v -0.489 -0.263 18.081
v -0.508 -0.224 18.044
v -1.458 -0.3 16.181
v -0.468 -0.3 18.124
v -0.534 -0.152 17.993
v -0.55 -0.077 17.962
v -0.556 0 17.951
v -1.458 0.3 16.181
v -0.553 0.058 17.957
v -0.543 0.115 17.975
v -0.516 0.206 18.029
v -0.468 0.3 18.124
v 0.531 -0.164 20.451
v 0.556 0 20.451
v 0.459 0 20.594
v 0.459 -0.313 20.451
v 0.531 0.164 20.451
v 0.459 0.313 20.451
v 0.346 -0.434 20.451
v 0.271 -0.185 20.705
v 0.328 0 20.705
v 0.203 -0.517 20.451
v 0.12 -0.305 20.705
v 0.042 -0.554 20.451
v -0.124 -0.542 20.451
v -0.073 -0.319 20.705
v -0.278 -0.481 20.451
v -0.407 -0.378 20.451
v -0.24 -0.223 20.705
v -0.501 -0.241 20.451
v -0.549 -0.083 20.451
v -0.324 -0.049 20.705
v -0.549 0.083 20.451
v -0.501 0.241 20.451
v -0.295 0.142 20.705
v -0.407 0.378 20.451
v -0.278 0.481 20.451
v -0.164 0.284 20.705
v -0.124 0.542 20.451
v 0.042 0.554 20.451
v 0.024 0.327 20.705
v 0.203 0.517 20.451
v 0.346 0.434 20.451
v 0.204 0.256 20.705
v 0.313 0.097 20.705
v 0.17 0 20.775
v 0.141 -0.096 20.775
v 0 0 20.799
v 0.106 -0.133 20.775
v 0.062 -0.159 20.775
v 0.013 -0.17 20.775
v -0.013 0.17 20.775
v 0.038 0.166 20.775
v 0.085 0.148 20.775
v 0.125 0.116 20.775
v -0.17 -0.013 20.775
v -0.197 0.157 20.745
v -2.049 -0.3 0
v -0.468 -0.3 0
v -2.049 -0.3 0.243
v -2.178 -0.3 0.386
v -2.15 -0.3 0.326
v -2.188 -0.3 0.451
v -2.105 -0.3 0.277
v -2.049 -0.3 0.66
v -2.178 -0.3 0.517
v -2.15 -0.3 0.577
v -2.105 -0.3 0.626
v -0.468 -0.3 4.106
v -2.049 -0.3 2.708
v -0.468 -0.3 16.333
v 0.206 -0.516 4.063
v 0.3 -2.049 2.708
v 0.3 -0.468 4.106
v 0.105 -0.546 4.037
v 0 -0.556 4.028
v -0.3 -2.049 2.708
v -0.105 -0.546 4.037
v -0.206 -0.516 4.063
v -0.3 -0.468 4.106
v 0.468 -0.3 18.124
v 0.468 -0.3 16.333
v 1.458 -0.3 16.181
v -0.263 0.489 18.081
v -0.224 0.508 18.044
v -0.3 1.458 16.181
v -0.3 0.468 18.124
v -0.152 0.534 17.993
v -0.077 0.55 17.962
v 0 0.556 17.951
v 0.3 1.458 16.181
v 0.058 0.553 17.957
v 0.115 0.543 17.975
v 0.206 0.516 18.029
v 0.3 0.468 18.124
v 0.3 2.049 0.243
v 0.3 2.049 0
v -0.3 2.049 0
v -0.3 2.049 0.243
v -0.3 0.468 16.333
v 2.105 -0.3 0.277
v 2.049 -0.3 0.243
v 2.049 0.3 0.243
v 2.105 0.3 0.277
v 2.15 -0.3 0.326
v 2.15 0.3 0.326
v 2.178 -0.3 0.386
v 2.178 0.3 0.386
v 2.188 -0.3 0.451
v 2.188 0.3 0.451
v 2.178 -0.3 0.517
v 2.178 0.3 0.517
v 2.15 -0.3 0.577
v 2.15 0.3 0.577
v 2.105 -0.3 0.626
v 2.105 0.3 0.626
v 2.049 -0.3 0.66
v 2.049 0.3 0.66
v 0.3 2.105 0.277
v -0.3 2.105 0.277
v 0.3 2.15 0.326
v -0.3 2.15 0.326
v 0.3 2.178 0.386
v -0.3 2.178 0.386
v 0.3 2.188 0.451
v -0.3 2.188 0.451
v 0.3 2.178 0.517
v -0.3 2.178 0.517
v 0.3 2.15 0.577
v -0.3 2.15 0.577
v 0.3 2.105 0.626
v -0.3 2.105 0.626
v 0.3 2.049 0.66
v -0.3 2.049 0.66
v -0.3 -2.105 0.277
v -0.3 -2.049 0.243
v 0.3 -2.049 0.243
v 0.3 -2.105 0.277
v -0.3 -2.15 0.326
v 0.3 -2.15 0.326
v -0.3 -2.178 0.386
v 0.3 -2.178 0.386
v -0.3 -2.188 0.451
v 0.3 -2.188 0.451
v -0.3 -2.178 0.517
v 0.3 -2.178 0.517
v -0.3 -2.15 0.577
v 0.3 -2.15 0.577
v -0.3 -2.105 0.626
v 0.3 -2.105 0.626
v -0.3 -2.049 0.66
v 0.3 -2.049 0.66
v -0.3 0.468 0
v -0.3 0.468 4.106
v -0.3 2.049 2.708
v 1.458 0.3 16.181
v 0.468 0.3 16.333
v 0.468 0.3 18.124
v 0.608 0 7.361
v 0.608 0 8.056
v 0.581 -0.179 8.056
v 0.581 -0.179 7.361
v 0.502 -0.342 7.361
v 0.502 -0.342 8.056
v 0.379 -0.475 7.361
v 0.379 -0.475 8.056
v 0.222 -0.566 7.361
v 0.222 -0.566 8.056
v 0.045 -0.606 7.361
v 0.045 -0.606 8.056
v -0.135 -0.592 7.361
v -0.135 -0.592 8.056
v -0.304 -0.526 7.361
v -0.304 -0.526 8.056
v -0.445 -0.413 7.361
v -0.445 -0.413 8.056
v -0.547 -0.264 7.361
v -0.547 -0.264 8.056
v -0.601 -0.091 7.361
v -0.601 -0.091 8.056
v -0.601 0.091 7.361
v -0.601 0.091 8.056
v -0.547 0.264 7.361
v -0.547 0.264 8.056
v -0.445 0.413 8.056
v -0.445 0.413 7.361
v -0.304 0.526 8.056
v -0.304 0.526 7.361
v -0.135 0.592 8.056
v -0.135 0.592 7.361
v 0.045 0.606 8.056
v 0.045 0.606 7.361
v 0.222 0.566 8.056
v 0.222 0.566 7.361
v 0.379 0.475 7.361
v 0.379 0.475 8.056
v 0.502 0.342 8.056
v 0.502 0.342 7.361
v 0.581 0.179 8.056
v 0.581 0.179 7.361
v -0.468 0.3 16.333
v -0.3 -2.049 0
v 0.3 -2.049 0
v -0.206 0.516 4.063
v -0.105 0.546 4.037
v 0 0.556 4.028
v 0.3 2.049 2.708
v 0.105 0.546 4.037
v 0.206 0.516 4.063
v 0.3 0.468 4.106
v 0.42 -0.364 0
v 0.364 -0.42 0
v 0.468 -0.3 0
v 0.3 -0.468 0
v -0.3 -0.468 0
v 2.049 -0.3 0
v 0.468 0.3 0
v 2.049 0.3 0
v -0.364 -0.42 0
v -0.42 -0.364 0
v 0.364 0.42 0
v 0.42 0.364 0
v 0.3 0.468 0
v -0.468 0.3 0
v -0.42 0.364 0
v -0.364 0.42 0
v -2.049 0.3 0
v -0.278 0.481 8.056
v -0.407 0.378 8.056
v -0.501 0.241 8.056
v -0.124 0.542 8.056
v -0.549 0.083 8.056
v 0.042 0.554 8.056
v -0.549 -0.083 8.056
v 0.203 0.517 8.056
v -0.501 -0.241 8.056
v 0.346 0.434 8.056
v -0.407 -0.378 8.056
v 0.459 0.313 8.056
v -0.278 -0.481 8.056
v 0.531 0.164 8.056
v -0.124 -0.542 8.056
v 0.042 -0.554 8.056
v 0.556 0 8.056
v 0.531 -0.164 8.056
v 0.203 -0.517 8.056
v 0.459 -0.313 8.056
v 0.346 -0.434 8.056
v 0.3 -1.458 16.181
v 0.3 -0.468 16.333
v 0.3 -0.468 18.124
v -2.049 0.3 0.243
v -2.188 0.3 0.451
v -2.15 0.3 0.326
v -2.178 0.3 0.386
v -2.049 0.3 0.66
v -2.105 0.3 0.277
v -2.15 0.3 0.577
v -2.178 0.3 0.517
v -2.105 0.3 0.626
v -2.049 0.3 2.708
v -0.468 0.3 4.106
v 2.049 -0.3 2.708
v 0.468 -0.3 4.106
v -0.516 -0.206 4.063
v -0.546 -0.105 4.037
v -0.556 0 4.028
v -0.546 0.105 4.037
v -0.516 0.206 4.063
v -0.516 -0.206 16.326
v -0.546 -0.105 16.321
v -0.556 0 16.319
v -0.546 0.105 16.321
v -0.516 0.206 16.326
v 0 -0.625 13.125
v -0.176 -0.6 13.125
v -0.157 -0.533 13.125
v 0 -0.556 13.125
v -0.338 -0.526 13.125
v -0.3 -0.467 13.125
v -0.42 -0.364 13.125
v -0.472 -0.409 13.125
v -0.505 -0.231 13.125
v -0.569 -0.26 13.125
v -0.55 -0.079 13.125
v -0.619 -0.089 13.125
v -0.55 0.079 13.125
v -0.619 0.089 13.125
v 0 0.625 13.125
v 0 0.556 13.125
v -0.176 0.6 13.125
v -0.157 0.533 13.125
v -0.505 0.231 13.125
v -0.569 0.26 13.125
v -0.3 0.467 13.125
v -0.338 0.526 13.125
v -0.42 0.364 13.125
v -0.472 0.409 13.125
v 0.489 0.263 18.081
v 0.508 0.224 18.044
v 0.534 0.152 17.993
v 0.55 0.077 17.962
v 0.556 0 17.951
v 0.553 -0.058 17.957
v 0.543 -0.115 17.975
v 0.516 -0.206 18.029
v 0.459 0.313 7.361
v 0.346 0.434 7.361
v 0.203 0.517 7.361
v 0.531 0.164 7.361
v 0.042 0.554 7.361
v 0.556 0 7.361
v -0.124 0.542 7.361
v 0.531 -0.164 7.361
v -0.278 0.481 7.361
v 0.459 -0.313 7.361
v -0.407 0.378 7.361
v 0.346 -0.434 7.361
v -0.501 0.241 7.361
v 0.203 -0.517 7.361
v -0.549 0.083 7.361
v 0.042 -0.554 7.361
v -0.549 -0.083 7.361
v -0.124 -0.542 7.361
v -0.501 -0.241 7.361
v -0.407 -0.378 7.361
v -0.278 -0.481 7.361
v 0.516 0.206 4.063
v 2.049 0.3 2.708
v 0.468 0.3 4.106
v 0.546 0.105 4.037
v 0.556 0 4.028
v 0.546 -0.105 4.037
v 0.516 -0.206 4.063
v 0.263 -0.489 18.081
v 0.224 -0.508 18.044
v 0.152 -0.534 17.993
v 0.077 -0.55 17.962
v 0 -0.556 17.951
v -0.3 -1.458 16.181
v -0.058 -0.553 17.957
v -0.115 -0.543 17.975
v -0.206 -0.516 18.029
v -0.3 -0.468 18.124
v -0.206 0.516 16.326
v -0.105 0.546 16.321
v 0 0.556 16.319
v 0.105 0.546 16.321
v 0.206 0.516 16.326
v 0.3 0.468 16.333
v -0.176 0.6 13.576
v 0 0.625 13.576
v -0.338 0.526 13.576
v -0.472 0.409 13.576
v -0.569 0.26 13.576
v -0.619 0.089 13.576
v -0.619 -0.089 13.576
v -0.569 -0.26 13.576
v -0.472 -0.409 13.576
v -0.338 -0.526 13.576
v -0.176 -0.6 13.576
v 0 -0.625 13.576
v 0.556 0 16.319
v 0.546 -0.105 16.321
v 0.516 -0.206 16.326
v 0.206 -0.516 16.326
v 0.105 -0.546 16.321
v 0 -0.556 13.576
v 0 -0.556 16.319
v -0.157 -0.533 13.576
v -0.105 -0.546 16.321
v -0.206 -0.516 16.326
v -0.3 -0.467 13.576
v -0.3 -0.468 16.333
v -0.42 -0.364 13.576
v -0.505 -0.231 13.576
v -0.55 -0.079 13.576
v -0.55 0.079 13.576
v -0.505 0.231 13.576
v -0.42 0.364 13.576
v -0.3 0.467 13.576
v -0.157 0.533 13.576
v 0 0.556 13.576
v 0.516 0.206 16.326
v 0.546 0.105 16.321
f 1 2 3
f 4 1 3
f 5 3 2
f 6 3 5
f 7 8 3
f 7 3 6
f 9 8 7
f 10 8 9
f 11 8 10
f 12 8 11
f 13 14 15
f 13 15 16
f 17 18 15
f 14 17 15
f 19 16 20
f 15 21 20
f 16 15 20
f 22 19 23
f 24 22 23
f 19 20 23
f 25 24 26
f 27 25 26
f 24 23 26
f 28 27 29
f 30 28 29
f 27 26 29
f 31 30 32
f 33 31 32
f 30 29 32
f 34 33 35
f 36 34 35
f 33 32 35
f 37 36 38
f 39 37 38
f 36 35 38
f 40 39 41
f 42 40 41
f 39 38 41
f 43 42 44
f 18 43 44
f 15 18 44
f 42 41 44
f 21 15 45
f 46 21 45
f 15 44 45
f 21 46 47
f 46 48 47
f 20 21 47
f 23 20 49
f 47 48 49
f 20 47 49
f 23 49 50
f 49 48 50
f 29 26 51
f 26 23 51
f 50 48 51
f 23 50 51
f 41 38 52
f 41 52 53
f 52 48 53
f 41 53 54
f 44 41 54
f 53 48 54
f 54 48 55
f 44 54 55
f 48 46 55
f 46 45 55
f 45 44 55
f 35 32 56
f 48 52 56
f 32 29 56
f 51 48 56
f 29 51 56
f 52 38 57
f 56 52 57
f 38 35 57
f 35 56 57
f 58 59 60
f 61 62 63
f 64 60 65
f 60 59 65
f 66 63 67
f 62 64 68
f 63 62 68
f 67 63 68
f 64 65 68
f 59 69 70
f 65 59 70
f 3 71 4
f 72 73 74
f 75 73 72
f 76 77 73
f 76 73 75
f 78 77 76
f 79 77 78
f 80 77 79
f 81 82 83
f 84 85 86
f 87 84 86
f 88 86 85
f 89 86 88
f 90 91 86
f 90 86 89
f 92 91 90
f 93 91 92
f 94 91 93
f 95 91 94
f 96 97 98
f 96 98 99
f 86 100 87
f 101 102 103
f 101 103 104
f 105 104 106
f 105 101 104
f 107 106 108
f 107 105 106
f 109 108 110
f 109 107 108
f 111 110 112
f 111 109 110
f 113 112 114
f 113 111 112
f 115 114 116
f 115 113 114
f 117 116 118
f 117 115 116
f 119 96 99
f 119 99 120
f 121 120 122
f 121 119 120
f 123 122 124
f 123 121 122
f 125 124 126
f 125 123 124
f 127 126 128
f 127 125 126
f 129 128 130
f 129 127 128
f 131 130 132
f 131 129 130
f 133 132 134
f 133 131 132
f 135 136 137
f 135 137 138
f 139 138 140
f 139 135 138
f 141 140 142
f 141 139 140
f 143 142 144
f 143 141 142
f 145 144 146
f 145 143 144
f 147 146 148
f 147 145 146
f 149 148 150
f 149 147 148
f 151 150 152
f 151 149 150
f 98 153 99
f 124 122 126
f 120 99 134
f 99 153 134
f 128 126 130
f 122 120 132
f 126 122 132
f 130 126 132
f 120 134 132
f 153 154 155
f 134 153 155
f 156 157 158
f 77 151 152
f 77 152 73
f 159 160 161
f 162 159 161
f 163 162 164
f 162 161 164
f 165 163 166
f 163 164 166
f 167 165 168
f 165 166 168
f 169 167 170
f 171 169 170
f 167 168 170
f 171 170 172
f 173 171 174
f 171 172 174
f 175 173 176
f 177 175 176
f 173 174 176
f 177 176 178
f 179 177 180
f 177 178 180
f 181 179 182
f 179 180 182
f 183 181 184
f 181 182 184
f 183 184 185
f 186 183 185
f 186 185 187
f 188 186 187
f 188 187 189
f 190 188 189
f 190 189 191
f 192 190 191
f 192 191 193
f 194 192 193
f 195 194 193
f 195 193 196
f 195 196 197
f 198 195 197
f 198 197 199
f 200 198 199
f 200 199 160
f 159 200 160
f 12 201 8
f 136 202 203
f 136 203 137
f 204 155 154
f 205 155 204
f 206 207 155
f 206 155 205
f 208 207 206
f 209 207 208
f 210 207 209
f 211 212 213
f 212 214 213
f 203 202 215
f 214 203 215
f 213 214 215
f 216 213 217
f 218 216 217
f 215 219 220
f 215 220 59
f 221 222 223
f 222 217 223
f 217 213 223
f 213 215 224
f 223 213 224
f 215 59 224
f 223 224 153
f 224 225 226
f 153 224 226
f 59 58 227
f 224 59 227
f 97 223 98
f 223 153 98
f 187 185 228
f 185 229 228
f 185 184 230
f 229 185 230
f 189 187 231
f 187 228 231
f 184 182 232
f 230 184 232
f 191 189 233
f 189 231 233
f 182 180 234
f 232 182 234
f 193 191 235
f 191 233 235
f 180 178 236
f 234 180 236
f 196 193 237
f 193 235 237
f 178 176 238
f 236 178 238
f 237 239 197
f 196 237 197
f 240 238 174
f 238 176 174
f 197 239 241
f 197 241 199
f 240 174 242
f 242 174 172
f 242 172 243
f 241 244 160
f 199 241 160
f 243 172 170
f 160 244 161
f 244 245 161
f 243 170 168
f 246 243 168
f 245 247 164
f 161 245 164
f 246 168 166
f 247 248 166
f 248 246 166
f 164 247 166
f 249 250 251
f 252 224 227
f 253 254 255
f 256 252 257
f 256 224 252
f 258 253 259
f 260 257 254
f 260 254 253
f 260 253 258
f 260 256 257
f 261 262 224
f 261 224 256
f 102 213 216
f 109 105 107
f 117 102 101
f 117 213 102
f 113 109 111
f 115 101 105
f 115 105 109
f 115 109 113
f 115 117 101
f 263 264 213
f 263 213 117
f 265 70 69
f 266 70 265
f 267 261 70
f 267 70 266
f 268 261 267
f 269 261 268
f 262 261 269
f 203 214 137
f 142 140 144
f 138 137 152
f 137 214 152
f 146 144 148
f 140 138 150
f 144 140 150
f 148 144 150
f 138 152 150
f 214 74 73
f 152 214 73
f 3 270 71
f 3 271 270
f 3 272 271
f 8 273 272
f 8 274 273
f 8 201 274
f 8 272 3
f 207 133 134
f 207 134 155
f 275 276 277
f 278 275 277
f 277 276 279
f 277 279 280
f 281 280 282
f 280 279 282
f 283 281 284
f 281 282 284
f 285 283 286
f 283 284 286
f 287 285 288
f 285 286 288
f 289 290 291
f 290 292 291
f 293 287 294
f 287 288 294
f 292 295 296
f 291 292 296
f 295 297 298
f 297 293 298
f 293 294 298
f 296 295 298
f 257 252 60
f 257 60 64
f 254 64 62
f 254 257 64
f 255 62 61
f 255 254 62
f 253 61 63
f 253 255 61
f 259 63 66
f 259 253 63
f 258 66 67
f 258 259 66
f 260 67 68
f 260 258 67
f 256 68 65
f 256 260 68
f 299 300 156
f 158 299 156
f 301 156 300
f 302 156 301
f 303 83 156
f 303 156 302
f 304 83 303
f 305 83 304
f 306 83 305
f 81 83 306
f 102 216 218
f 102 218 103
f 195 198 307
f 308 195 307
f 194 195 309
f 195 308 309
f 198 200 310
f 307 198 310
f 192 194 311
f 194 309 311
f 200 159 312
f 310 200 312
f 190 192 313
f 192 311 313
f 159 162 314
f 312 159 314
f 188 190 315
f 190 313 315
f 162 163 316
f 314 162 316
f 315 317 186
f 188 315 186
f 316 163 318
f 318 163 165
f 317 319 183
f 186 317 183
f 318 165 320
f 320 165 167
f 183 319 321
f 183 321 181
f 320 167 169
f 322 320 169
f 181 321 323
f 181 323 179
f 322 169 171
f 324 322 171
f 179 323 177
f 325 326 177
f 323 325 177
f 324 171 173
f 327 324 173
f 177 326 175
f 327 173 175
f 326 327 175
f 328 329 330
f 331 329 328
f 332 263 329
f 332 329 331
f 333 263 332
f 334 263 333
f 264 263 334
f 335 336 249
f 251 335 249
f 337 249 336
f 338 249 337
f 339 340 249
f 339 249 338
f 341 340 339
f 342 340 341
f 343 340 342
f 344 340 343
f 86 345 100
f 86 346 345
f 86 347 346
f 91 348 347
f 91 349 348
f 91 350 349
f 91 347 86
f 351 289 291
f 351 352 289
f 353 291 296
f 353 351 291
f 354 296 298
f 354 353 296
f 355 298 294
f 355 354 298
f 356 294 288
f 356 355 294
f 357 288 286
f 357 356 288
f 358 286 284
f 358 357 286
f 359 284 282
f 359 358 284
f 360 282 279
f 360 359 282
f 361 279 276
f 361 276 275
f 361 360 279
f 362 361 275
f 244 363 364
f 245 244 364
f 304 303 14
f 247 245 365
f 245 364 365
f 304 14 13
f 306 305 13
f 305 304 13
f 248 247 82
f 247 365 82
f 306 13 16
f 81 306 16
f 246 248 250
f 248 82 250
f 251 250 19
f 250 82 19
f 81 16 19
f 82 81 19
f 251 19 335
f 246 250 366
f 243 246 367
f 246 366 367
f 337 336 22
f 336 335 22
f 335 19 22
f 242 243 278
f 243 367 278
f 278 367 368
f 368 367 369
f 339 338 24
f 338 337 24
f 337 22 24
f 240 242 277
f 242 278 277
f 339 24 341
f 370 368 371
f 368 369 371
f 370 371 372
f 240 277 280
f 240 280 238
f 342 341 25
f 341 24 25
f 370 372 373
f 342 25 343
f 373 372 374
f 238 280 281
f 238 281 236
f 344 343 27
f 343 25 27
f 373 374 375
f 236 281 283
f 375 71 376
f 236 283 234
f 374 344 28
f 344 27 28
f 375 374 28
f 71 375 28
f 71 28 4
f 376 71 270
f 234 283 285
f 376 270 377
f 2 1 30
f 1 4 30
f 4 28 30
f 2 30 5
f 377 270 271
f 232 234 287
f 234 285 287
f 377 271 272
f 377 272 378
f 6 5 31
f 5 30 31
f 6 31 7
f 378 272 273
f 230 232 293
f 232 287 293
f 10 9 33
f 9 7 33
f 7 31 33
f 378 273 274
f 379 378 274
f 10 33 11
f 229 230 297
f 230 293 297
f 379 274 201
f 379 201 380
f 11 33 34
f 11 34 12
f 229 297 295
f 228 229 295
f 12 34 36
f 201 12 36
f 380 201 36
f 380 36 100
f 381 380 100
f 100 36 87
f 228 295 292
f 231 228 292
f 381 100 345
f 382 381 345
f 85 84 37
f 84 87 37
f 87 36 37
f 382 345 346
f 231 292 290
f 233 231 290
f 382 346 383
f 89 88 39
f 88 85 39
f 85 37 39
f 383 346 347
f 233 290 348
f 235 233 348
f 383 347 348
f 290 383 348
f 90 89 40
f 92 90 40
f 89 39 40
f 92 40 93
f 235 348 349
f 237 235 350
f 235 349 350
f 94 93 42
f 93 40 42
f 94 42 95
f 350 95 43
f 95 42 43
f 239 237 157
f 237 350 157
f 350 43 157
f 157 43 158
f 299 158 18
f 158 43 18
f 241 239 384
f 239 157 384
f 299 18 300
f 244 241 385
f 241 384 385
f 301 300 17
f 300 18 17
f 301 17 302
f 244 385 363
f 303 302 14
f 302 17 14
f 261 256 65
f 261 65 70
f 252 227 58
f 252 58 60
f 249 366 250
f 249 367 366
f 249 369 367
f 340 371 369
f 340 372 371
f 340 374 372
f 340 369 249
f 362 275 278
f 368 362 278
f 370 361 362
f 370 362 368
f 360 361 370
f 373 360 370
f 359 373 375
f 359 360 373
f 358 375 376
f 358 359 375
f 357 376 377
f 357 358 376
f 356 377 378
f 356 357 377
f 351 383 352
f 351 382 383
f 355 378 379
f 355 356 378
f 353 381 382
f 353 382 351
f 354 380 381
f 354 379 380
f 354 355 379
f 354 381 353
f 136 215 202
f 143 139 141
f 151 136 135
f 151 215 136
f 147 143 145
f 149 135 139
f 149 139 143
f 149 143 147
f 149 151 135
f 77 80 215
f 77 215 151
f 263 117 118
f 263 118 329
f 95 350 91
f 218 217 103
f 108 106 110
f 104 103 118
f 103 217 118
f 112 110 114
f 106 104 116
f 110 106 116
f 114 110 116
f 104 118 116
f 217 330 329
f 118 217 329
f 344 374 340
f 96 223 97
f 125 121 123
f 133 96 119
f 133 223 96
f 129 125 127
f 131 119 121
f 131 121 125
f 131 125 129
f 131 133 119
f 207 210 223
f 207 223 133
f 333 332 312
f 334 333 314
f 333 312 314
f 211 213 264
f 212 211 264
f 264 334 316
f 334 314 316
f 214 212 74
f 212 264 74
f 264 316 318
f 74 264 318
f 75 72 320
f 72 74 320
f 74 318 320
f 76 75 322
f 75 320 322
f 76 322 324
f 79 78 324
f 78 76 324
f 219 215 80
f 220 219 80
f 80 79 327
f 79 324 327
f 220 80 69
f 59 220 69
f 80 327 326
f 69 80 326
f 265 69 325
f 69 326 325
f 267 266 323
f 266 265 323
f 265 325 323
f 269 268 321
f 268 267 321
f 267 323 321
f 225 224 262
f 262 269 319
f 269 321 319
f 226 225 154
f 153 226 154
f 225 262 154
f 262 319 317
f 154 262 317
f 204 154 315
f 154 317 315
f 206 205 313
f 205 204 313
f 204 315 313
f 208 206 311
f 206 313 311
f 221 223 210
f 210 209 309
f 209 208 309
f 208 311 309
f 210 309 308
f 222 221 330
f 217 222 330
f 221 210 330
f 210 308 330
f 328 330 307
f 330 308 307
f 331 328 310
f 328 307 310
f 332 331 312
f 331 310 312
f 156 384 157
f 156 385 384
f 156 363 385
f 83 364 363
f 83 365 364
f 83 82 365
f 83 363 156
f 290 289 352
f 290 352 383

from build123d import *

# Parameters (mm, degrees)
F3_DEPTH      = 0.3
F4_COUNT      = 4
F5_W          = 0.625
F5_H          = 0.451389
F6_ANGLE_BACK = 90
F6_ANGLE      = 180


with BuildPart() as f1:
    # F0 (on Front) → F1 (revolve)
    with BuildSketch(Plane.XZ):
        with BuildLine():
            Line((0, 20.798611), (0, 0))
            Line((0, 0), (0.555556, 0))
            Line((0.555556, 0), (0.555556, 7.361111))
            Line((0.555556, 7.361111), (0.607639, 7.361111))
            Line((0.607639, 7.361111), (0.607639, 8.055556))
            Line((0.607639, 8.055556), (0.555556, 8.055556))
            Line((0.555556, 8.055556), (0.555556, 20.451389))
            ThreePointArc((0.555556, 20.451389), (0.327569, 20.704666), (0, 20.798611))
        make_face()
    revolve(axis=Axis((0, 0, 10.399306), (0, 0, -1)))

    # F2 (on Front) → F3 (join, symmetric)
    with BuildSketch(Plane.XZ):
        with BuildLine():
            Line((0, 0), (2.048611, 0))
            Line((2.048611, 0), (2.048611, 0.243056))
            ThreePointArc((2.048611, 0.243056), (2.1875, 0.451389), (2.048611, 0.659722))
            Line((2.048611, 0.659722), (2.048611, 2.708333))
            Line((2.048611, 2.708333), (0.4, 4.165245))
            Line((0.4, 4.165245), (0.4, 16.343376))
            Line((0.4, 16.343376), (1.458333, 16.180556))
            Line((1.458333, 16.180556), (0, 19.041132))
            Line((0, 19.041132), (0, 0))
        make_face()
    extrude(amount=F3_DEPTH, both=True)

    # F4: F1 ×4 about axis
    f4_axis = Axis((0, 0, 8.055556), (0, 0, 1))


with BuildPart() as f1_1:
    add(f1.part)
    for i in range(1, F4_COUNT):
        add(f1.part.rotate(f4_axis, i * 360 / F4_COUNT))

    # F5 (on Front) → F6 (revolve)
    with BuildSketch(Plane.XZ, mode=Mode.PRIVATE) as f6_sk:
        with Locations((-0.3125, 13.350694)):
            Rectangle(F5_W, F5_H)
    revolve(f6_sk.sketch.rotate(Axis((0, 0, 8.055556), (0, 0, 1)), -F6_ANGLE_BACK), axis=Axis((0, 0, 8.055556), (0, 0, 1)), revolution_arc=F6_ANGLE)


solid = f1_1.part
